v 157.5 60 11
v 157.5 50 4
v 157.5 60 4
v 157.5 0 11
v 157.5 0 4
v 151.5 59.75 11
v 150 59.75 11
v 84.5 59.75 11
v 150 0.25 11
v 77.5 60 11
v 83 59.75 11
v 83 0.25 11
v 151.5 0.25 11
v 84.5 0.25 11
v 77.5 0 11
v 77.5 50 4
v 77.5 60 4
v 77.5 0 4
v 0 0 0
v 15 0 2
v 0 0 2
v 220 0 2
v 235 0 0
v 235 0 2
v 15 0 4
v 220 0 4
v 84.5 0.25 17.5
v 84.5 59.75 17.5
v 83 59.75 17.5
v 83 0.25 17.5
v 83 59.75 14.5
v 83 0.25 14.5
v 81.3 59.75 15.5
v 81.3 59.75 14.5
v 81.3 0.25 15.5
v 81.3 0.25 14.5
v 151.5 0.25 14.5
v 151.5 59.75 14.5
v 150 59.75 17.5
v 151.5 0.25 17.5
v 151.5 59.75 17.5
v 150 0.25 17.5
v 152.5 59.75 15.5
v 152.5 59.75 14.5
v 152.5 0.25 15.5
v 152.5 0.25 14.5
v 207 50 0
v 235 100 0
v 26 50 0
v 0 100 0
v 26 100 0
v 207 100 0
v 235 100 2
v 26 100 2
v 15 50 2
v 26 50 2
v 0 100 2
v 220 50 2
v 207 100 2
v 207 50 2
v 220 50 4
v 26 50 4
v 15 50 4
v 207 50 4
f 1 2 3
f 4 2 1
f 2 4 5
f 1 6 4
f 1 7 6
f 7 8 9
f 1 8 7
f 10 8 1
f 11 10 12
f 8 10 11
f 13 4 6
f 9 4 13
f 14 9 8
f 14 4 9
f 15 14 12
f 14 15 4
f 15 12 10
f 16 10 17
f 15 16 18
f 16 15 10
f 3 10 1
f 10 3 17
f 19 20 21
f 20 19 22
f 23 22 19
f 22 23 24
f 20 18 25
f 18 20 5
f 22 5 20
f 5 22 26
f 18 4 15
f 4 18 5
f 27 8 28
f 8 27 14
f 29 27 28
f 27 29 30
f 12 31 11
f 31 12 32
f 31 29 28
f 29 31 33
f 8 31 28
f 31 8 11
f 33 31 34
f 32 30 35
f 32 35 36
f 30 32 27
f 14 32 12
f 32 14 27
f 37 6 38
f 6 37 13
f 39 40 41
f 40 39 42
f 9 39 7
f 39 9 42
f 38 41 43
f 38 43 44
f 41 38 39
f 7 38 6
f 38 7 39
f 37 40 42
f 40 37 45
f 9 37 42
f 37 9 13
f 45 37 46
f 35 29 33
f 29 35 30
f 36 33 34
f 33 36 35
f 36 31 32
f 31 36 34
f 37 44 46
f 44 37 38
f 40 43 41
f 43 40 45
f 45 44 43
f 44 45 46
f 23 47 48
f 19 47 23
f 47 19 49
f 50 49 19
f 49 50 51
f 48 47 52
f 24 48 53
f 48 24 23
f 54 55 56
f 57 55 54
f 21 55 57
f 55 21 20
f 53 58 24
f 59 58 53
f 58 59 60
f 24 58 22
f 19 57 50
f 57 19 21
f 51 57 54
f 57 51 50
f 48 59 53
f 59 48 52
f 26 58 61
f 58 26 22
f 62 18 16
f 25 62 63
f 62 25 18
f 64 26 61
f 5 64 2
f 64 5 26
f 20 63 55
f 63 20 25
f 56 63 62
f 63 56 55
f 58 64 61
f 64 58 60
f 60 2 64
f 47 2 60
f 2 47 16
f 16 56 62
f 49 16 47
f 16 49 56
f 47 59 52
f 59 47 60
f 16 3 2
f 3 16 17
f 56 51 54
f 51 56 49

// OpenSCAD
// file: ../../clip.scad
use <./utils.scad>

tollerance = 0.5;

module femaleClip(holeWidth, holeHeight, thickness) {
    difference() {
    translate([0,0,thickness]) cube([width, height, thickness]);
    translate([CENTER(width, holeWidth), CENTER(height, holeHeight), thickness]) cube([holeWidth, holeHeight, thickness]);
    }
}

module maleClip(width, height, holeHeight, thickness, edgeWidth) {
    cube([width, height, thickness]);
    clipHeight = holeHeight - tollerance;
    clipWidth = thickness*.5;
    clipDepth = thickness *2 + tollerance;

    translate([edgeWidth/2+tollerance, CENTER(height, clipHeight),thickness]) cube([clipWidth, clipHeight, clipDepth]);
    translate([width-edgeWidth/2-1-clipWidth, CENTER(height, clipHeight),thickness]) cube([clipWidth, clipHeight, clipDepth]);
    translate([edgeWidth/2+tollerance, CENTER(height, clipHeight)+clipHeight, clipDepth]) rotate(180) {
        clipExtension(clipHeight, thickness, 1.7, 1);
    }

    translate([width-edgeWidth/2-1, CENTER(height, clipHeight),clipDepth]) 
    clipExtension(clipHeight, thickness, 1., 1);
}

module clipExtension(width, height, depth, edge) {
    rotate([90,0,0]) {
        translate([0,0,-width]) linear_extrude(height=width) polygon([
            [0, 0],
            [0, height],
            [depth, edge],
            [depth, 0],
            [0, 0],
        ]);
    }
}
// file: ../../utils.scad
function CENTER(parentCoordinate, childCoordinate) = 
    parentCoordinate / 2 - childCoordinate / 2;
// main file
use <./../../utils.scad>
use <./../../clip.scad>;

screenStandWidth = 81;
screenStandHeight = 50;

interfaceHeight = 100;
interfaceThickness = 2;
thickness = 4;

width = 235;
height = 50;
backplateWidth = width-30;

clipHoleWidth=70;
clipHoleHeight=50;

difference() {
    union() {
        screenInterface(width, interfaceHeight, interfaceThickness);
        translate([CENTER(width, backplateWidth),0,0]) backplate(backplateWidth, height, thickness);
        translate([CENTER(width, clipHoleWidth+10),0,0]) screenStand(clipHoleWidth+10, clipHoleHeight+10, thickness*2);
    }

    gapWidth = 50;

    translate([width/2-screenStandWidth/2-gapWidth-1, height, 0]) gap(gapWidth*2+screenStandWidth, gapWidth, thickness);
}

module gap(width, height, thickness) {
        #cube([width, height, thickness]);
}

module screenInterface(width, height, depth) {
        cube([width, height, depth]);
}

module backplate(width, height, thickness) {
    cube([width, height, thickness]);
}

module screenStand (width, height, thickness) {
    union() {
        cube([width, height, thickness]);
        translate([0,0, thickness]) maleClip(width, height, height, 3, 10);
    }
}
